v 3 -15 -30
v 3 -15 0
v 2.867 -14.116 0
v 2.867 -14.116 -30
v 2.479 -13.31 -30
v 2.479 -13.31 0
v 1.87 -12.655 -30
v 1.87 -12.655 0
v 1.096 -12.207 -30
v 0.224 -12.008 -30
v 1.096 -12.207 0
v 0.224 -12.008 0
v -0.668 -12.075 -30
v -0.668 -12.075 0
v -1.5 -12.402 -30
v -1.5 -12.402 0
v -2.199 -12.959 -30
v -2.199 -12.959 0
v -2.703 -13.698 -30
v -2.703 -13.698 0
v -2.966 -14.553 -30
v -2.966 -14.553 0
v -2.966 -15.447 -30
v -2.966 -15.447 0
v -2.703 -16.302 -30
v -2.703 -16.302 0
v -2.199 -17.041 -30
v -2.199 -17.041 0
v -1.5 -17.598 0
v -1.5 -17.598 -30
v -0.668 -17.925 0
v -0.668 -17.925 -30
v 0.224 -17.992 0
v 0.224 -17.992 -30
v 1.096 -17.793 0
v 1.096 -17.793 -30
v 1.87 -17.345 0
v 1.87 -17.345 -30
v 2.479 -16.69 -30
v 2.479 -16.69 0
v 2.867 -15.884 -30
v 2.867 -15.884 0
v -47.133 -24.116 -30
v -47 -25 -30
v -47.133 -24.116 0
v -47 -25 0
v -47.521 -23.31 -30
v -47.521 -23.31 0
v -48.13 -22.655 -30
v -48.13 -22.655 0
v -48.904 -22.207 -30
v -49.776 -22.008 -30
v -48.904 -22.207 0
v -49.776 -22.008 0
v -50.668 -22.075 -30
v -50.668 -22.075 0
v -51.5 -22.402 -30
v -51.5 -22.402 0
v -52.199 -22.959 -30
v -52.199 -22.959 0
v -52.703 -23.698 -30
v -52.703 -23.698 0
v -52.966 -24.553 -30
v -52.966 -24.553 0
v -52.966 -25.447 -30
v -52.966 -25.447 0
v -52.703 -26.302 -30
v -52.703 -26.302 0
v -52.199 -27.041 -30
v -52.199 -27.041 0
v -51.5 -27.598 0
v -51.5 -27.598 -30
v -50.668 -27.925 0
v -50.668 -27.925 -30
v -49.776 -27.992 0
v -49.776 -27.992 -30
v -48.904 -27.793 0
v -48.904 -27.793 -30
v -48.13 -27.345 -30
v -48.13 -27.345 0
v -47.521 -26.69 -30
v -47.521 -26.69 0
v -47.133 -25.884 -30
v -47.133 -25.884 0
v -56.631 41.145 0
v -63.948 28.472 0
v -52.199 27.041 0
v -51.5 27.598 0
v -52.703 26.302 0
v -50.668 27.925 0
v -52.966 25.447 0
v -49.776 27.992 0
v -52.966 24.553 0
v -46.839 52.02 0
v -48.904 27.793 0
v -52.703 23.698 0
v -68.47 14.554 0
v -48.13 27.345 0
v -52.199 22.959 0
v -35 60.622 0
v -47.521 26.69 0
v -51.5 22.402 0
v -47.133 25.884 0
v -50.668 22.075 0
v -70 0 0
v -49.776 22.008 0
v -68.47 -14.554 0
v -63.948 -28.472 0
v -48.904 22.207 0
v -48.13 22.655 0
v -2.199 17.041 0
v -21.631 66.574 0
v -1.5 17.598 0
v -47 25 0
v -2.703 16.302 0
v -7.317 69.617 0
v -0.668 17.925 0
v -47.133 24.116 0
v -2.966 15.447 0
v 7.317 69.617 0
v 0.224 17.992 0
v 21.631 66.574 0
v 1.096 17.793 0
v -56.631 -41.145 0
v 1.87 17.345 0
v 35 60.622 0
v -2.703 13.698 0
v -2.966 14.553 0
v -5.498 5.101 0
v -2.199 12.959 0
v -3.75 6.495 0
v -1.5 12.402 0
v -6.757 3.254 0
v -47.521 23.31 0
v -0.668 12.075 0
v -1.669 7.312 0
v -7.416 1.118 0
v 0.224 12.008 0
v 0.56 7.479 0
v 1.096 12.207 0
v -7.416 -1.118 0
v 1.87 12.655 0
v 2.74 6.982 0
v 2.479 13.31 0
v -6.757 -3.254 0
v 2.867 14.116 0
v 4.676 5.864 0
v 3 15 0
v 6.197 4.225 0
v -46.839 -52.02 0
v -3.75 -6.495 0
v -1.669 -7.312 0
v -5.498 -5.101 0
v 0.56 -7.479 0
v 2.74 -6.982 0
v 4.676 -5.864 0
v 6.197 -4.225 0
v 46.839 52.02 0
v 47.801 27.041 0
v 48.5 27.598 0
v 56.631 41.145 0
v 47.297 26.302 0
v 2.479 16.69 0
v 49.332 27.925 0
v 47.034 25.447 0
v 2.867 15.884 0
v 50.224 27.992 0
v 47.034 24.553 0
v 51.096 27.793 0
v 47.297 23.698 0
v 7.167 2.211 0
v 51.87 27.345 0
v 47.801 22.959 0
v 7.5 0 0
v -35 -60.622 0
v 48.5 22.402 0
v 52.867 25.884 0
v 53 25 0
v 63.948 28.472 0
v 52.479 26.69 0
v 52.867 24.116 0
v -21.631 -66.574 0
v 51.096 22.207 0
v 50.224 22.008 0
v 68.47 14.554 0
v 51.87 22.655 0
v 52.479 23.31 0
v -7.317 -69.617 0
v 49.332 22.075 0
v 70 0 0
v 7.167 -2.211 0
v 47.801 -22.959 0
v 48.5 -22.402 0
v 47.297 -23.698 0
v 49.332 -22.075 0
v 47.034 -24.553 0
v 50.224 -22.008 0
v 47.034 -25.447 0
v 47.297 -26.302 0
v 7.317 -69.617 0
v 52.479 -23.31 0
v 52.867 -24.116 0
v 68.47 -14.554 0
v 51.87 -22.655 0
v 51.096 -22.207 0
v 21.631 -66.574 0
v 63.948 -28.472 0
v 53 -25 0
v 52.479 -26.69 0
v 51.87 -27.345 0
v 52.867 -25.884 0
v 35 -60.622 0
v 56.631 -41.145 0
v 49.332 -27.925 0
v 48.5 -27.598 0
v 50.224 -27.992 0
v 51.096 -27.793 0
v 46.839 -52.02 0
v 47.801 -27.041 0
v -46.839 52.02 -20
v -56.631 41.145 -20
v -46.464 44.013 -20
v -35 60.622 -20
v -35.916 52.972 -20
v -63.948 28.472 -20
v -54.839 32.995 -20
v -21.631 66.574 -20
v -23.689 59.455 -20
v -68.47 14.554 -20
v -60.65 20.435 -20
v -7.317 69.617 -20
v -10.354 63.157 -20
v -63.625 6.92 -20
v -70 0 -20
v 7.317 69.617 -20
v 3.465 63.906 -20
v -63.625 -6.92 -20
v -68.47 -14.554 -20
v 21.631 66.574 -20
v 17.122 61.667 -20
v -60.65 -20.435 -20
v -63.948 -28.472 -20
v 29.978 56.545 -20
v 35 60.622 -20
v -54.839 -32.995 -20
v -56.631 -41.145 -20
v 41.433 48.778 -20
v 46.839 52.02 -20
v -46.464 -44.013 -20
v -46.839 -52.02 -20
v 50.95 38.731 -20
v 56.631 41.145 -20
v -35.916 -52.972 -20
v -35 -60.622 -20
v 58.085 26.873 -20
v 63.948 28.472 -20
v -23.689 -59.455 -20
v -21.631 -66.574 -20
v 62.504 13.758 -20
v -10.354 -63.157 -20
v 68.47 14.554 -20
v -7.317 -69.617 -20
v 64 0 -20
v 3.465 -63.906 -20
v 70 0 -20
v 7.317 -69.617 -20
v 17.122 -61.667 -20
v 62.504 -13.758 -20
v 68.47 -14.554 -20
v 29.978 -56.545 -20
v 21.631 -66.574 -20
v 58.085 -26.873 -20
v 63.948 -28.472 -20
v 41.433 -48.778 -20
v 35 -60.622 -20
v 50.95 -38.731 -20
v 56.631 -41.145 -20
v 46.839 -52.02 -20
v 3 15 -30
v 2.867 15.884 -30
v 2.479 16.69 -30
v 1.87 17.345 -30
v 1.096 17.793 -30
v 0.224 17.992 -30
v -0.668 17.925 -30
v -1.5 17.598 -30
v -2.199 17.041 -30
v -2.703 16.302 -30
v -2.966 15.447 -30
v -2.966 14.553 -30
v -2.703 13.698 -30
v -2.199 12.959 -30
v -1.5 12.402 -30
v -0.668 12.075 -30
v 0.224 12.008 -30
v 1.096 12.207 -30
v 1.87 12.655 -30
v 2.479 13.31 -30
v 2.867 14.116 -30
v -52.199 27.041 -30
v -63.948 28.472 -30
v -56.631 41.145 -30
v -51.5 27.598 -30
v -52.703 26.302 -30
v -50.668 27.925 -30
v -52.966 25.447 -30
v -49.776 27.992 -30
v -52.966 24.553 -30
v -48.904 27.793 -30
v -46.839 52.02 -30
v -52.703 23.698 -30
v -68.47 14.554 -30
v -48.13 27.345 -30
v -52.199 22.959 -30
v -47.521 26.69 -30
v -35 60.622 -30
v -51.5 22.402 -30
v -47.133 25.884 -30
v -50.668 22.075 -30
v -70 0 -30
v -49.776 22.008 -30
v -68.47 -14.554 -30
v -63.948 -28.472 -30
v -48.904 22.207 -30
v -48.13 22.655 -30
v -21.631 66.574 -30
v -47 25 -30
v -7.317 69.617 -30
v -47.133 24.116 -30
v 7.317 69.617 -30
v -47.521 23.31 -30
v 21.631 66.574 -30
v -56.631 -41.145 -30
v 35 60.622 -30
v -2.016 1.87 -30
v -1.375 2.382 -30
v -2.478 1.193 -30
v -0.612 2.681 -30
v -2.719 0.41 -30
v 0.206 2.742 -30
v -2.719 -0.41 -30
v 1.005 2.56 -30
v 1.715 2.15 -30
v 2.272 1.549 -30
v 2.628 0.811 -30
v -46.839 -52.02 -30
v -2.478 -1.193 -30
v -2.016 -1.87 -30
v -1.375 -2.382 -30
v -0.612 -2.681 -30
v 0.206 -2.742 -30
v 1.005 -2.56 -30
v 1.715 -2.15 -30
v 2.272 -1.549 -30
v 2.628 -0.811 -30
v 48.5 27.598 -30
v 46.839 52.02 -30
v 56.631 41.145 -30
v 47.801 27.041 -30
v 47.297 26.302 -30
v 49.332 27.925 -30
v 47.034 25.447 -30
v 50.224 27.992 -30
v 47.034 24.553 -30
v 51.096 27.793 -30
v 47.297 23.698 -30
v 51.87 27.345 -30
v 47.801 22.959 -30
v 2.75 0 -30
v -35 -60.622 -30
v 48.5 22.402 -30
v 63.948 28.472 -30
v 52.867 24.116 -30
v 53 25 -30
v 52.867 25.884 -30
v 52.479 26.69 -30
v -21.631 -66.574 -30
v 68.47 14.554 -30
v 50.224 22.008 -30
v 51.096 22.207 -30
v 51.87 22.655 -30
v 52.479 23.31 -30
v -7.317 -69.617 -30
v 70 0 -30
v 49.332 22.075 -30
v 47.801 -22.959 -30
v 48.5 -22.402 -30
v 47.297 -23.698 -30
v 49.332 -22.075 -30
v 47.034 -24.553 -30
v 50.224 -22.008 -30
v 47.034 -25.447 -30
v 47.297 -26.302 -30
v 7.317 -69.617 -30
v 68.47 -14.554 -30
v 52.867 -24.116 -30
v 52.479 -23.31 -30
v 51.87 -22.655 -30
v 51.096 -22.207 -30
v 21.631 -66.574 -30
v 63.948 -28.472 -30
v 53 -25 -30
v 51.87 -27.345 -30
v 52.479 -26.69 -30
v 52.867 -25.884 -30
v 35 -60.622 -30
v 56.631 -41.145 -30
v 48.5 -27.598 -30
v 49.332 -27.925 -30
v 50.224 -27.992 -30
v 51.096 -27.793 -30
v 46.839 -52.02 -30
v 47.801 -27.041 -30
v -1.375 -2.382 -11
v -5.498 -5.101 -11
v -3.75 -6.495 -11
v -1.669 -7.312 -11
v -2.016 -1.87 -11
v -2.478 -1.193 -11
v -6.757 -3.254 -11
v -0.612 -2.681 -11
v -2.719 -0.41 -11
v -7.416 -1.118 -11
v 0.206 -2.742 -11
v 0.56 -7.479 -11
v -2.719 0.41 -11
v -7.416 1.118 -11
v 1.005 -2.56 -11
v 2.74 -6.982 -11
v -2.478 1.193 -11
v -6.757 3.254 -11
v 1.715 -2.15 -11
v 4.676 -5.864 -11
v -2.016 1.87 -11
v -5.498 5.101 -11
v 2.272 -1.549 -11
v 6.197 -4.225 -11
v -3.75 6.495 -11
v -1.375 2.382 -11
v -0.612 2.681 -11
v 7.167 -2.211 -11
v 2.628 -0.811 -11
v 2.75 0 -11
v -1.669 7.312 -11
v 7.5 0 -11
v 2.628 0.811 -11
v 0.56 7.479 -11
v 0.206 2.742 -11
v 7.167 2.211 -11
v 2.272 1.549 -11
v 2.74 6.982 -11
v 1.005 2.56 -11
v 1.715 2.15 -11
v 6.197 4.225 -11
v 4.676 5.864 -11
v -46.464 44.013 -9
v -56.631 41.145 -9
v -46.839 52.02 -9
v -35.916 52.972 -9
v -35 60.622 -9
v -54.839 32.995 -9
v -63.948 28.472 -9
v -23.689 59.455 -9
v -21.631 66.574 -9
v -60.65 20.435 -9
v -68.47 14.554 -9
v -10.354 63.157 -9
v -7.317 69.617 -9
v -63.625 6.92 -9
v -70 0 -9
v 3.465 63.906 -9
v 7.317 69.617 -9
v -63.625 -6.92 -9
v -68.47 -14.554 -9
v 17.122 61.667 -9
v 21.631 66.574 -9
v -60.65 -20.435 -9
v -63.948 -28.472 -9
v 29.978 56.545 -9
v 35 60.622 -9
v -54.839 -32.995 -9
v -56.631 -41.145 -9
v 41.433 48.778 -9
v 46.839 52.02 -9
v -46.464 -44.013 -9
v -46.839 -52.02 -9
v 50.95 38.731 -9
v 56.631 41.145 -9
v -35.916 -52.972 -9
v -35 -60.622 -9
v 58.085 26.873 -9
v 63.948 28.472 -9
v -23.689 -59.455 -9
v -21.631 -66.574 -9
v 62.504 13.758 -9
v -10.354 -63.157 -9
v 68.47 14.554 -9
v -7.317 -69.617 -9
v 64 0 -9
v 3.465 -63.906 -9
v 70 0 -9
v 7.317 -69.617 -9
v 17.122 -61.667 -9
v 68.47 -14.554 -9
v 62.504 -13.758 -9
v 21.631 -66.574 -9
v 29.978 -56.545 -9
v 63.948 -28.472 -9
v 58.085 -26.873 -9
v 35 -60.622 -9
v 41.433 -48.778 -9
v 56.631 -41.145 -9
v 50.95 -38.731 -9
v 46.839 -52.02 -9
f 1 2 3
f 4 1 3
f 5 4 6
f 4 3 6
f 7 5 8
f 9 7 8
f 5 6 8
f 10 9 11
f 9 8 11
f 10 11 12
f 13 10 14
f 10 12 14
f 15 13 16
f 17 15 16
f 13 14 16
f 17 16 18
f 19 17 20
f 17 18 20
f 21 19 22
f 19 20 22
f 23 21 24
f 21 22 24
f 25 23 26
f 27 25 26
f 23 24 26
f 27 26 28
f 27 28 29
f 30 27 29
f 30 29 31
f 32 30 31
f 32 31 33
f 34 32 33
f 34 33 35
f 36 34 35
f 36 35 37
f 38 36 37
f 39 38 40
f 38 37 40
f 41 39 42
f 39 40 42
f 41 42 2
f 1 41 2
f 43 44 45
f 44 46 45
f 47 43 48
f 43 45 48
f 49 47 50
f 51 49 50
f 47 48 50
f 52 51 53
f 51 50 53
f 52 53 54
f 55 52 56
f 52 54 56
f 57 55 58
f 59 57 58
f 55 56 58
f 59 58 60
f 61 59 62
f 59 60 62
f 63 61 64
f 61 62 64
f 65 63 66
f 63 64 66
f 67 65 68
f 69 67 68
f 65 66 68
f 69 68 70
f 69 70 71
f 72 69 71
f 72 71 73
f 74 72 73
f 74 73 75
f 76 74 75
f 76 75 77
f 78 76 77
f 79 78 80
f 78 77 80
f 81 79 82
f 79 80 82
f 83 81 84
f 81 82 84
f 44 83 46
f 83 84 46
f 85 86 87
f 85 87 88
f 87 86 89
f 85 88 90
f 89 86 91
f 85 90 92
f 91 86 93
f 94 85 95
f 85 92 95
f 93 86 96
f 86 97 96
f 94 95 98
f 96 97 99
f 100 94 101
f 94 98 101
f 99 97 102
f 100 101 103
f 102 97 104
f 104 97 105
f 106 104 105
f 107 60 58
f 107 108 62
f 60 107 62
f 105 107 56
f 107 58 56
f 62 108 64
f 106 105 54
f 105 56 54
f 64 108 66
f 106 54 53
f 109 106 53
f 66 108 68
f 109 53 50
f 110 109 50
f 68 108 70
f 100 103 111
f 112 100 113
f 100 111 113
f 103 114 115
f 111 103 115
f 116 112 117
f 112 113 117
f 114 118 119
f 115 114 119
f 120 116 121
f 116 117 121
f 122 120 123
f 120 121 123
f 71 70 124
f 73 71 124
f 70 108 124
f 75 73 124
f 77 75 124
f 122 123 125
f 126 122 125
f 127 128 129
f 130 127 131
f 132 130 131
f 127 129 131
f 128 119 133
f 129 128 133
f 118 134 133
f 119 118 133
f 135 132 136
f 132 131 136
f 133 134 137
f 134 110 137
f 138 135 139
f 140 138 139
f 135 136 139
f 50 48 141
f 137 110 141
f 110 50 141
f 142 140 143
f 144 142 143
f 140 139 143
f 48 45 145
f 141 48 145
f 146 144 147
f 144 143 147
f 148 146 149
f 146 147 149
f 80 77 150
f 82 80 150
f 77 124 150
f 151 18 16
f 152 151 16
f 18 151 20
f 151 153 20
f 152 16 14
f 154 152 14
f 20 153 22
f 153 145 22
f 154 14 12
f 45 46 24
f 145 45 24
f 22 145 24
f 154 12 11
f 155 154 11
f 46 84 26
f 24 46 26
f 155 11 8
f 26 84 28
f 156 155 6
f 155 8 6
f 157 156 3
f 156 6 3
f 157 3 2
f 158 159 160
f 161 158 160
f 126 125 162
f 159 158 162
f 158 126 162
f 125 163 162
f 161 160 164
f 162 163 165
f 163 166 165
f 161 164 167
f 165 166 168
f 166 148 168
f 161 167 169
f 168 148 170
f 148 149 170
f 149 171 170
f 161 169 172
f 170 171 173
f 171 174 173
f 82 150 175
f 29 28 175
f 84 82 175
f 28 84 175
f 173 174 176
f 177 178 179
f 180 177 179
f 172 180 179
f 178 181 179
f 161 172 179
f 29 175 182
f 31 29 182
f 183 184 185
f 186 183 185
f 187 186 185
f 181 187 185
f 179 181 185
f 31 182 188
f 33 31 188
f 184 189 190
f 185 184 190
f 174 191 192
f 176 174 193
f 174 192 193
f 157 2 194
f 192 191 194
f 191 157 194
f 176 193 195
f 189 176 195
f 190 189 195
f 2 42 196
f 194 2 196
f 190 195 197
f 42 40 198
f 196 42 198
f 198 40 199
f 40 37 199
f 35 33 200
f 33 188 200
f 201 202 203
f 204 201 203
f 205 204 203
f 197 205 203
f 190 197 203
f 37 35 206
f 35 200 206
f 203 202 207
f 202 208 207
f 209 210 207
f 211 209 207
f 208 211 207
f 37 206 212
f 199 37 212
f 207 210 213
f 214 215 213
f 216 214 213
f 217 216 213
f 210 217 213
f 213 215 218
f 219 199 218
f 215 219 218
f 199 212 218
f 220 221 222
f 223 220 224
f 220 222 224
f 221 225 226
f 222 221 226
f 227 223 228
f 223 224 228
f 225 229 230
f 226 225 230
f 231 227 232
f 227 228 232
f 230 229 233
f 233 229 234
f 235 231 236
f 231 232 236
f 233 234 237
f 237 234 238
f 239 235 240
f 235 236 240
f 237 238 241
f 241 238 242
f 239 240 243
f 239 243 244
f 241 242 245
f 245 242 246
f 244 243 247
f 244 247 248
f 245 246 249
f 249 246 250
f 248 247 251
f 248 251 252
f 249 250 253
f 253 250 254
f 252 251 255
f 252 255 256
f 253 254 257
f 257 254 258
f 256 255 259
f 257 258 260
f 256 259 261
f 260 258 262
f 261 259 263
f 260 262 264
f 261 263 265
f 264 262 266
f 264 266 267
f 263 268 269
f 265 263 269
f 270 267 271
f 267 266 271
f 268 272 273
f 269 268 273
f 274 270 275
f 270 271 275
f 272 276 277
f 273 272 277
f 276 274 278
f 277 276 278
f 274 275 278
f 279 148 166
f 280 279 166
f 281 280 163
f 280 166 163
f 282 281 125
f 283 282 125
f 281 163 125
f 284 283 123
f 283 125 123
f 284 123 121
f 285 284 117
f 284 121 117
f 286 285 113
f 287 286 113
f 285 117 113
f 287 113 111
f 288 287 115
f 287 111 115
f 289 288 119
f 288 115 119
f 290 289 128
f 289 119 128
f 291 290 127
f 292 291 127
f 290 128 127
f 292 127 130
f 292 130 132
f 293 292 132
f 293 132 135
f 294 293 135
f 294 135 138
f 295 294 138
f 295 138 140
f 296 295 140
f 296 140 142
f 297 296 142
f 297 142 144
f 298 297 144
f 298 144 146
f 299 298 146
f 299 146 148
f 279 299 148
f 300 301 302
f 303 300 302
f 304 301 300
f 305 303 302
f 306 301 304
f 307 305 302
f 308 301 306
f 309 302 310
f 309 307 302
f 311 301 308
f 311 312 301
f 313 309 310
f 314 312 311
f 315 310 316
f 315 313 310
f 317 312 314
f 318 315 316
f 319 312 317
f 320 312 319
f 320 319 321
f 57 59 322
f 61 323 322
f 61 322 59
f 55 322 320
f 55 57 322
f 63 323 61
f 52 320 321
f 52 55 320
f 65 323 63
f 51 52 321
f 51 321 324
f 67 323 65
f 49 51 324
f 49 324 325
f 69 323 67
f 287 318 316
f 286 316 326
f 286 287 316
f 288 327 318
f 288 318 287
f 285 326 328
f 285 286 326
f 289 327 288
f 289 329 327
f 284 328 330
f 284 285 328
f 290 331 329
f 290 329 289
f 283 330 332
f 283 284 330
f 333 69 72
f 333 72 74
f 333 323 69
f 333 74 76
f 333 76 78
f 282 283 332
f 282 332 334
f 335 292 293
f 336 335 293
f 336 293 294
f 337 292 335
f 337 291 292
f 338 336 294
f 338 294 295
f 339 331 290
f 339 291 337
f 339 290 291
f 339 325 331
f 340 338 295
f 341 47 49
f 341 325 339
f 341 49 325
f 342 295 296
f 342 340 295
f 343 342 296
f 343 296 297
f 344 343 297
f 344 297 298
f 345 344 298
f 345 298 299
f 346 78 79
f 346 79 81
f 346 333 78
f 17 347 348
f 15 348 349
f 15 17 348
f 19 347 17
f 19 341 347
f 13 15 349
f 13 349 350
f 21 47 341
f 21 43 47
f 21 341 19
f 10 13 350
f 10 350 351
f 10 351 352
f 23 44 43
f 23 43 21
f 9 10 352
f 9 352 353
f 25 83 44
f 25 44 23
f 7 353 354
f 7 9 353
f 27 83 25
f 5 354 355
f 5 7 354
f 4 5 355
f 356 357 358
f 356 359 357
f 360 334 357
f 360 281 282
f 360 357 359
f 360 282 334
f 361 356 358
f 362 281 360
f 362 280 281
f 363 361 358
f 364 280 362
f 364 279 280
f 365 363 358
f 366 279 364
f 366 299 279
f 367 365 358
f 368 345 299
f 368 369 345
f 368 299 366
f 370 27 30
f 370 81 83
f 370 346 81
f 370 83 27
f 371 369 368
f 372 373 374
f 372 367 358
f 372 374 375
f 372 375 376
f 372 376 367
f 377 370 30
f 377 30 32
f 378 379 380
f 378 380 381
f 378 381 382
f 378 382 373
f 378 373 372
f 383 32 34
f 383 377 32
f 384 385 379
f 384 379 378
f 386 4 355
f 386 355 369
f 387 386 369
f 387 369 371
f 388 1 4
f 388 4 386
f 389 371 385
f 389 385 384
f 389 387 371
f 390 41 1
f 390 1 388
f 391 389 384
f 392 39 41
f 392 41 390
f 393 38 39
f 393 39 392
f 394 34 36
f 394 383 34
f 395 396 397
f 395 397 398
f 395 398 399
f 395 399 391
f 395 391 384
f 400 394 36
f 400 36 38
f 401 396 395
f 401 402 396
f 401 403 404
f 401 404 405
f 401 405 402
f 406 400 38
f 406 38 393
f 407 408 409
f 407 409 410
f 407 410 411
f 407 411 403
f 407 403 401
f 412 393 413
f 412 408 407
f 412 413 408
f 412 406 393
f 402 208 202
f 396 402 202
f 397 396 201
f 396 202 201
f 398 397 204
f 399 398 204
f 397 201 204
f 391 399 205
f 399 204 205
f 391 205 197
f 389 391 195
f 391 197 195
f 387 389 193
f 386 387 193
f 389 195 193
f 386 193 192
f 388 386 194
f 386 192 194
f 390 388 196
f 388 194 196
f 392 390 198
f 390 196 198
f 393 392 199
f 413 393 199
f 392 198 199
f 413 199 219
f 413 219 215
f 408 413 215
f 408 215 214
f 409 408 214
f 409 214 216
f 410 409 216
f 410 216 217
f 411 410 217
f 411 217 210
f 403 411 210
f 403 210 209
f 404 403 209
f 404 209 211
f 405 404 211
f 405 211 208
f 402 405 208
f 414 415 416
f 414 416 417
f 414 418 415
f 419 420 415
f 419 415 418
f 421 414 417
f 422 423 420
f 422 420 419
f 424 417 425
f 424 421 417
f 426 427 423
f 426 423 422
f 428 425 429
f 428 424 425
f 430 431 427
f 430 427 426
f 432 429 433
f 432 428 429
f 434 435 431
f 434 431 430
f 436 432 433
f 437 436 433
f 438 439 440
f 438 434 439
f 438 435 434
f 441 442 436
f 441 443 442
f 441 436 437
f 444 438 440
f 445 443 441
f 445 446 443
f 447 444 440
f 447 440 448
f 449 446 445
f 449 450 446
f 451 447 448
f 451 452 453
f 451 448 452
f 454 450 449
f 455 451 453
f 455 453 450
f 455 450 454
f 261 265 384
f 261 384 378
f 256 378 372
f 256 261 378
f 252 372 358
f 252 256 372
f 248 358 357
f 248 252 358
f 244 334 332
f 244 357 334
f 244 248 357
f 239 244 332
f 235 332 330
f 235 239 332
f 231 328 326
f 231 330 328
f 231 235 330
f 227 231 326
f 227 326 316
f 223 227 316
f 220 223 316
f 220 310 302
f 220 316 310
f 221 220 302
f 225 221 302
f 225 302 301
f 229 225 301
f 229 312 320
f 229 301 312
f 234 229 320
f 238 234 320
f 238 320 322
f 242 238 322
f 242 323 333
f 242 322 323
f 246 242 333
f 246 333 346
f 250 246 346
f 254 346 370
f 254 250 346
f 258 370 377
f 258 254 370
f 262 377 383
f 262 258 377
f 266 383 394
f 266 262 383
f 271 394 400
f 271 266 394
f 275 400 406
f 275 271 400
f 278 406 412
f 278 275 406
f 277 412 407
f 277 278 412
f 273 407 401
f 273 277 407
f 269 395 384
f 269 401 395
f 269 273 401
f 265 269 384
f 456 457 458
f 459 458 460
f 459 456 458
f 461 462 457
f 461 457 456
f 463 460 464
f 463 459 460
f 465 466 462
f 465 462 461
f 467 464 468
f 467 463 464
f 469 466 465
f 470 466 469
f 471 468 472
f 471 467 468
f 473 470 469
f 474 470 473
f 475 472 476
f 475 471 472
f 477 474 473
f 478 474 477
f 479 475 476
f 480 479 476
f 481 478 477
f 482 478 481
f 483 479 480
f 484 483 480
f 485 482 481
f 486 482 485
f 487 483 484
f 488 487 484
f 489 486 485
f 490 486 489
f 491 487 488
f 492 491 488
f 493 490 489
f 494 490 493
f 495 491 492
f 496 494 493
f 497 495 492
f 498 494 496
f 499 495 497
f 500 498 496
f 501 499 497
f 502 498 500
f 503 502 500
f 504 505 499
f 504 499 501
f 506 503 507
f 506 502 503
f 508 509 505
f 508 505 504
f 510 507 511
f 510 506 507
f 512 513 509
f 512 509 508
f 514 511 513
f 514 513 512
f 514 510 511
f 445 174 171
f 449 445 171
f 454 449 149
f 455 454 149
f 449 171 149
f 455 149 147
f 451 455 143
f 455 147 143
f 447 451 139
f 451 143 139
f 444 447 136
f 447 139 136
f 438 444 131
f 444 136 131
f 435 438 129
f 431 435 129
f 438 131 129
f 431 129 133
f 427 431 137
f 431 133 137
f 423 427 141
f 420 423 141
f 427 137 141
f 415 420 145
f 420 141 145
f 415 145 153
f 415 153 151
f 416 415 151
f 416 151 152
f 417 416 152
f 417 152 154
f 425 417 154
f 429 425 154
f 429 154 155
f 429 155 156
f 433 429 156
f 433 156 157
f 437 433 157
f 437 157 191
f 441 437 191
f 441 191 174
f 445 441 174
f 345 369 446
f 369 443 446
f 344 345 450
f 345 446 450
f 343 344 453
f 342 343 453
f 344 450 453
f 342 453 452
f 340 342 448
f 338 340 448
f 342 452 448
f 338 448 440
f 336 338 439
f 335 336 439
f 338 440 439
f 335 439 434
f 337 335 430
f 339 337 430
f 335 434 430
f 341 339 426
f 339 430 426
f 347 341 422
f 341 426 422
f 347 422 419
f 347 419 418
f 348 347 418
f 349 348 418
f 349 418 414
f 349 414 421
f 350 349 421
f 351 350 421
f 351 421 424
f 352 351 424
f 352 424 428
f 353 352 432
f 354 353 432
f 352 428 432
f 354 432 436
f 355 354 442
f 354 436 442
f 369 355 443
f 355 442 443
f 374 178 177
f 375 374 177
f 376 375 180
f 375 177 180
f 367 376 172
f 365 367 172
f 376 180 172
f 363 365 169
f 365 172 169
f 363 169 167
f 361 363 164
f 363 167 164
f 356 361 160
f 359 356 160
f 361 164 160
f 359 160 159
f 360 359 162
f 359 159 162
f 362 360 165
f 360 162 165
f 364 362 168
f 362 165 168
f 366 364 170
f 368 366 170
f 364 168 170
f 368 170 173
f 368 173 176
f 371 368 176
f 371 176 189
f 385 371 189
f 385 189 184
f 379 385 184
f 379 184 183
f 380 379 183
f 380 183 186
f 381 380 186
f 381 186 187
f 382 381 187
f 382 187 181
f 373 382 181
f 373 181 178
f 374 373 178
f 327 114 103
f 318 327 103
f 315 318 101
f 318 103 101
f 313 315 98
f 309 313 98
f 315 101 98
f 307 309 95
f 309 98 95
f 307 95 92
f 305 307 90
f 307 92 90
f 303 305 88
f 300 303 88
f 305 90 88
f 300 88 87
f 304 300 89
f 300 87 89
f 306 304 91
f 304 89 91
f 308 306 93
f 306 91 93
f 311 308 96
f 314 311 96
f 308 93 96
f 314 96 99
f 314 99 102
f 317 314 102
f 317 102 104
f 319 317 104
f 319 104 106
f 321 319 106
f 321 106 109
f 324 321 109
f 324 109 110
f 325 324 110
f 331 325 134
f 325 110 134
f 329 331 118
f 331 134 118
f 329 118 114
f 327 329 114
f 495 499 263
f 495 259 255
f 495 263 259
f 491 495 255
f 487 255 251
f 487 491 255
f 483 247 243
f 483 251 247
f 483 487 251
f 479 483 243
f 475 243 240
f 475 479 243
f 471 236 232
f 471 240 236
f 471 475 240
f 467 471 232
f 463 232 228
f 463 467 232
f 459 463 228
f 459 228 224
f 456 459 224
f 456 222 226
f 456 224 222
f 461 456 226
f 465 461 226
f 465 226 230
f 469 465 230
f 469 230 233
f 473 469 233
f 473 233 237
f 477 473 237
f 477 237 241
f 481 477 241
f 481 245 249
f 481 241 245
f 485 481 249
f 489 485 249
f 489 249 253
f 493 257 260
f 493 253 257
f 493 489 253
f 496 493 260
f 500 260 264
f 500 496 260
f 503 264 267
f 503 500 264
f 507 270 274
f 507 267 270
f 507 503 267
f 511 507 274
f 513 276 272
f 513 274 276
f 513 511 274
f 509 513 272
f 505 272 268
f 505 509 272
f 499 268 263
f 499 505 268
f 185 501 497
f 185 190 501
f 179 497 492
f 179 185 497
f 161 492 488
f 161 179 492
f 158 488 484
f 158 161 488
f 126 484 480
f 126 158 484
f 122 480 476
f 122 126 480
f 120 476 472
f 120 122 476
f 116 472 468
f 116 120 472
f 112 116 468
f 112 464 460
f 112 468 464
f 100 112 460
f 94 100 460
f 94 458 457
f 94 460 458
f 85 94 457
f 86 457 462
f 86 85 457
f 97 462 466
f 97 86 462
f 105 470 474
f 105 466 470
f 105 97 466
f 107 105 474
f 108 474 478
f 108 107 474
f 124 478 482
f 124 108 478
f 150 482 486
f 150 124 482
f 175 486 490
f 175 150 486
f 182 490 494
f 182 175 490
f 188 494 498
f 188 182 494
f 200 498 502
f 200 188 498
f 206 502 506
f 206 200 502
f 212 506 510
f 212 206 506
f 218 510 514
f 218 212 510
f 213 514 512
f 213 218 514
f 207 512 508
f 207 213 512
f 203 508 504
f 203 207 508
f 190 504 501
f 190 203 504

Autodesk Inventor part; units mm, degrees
ref_plane "YZ Plane" through (0, 0, 0) normal (1, 0, 0) x (0, 1, 0)
ref_plane "XZ Plane" through (0, 0, 0) normal (0, 1, 0) x (-1, 0, 0)
ref_plane "XY Plane" through (0, 0, 0) normal (0, 0, 1) x (1, 0, 0)
ref_plane "Work Plane1" through (-40, 0, 12) normal (0, 1, 0) x (1, 0, 0)
sketch "Sketch2" plane through (-40, 0, 12) normal (0, 1, 0) x (1, 0, 0)
  line L0 (-30, 12) -> (110, 12) projected
  line L1 (40, 12) -> (40, 42)
  line L2 (40, 42) -> (110, 42)
  line L3 (110, 42) -> (110, 12)
  line L4 (110, 32) -> (104, 32)
  line L5 (104, 32) -> (104, 21)
  line L6 (104, 21) -> (110, 21)
  line L7 (110, 12) -> (40, 12)
  line L8 (40, 12) -> (40, 7)
  line L9 (40, 7) -> (110, 7)
  line L10 (110, 7) -> (110, 12)
  dimension "d3" = 30
  dimension "d4" = 10
  dimension "d5" = 11
  dimension "d6" = 6
  dimension "d17" = 5
revolve "Revolution1" add sketch "Sketch2" angle 360 about axis through (0, 0, 0) along (0, 0, -1) contours L1 L2 L3 L4 L5 L6 L0
sketch "Sketch3" plane through (0, 0, 0) normal (0, 0, 1) x (1, 0, 0)
  circle A0 centre (0, 0) radius 7.5
  dimension "d11" = 15
sketch "Sketch4" plane through (0, 0, 0) normal (0, 0, 1) x (1, 0, 0)
  circle A0 centre (50, 25) radius 2.05 projected
  circle A1 centre (-50, -25) radius 2.05 projected
  circle A2 centre (0, 15) radius 2.05 projected
  circle A3 centre (50, -25) radius 2.05 projected
  circle A4 centre (0, -15) radius 2.05 projected
  circle A5 centre (-50, 25) radius 2.05 projected
  line L0 (-40, 55) -> (40, 55) projected
  line L1 (40, 25) -> (40, 55) projected
  line L2 (40, 25) -> (-40, 25) projected
  line L3 (-40, 55) -> (-40, 25) projected
  line L4 (-40, -31) -> (40, -31) projected
  line L5 (40, -57.4456) -> (40, -31) projected
  arc A6 (40, -57.4456) -> (-40, -57.4456) centre (0, 0) ccw projected
  line L6 (-40, -31) -> (-40, -57.4456) projected
  circle A7 centre (-50, 25) radius 3
  circle A8 centre (-50, -25) radius 3
  circle A9 centre (0, -15) radius 3
  circle A10 centre (0, 15) radius 3
  circle A11 centre (50, 25) radius 3
  circle A12 centre (50, -25) radius 3
  dimension "d8" = 6
extrude "Extrusion2" cut sketch "Sketch4" against normal through all contours A0 | A1 | A2 | A3 | A4 | A5 | A7 | A8 | A9 | A10 | A11 | A12
extrude "Extrusion3" cut sketch "Sketch3" against normal blind 11
sketch "Sketch5" plane through (0, 0, -11) normal (0, 0, 1) x (1, 0, 0)
  circle A0 centre (0, 0) radius 2.75
  dimension "d14" = 5.5
extrude "Extrusion4" cut sketch "Sketch5" against normal through all
sketch "Sketch6" plane through (0, 0, 0) normal (0, 0, 1) x (1, 0, 0)
  point P0 (0, 0)
equation "\"BendRadius\" = Thickness"
equation "\"BendReliefWidth\" = Thickness"
equation "\"BendReliefDepth\" = 0.5 * Thickness"
equation "\"CornerReliefSize\" = 4 * Thickness"
equation "\"MinimumRemnant\" = 2 * Thickness"
equation "\"TransitionRadius\" = BendRadius"
equation "\"JacobiRadiusSize\" = BendRadius"
equation "\"GapSize\" = Thickness"
equation "\"Thickness\" = 3.048"
properties part number "base-top-plate_3DPrint"
